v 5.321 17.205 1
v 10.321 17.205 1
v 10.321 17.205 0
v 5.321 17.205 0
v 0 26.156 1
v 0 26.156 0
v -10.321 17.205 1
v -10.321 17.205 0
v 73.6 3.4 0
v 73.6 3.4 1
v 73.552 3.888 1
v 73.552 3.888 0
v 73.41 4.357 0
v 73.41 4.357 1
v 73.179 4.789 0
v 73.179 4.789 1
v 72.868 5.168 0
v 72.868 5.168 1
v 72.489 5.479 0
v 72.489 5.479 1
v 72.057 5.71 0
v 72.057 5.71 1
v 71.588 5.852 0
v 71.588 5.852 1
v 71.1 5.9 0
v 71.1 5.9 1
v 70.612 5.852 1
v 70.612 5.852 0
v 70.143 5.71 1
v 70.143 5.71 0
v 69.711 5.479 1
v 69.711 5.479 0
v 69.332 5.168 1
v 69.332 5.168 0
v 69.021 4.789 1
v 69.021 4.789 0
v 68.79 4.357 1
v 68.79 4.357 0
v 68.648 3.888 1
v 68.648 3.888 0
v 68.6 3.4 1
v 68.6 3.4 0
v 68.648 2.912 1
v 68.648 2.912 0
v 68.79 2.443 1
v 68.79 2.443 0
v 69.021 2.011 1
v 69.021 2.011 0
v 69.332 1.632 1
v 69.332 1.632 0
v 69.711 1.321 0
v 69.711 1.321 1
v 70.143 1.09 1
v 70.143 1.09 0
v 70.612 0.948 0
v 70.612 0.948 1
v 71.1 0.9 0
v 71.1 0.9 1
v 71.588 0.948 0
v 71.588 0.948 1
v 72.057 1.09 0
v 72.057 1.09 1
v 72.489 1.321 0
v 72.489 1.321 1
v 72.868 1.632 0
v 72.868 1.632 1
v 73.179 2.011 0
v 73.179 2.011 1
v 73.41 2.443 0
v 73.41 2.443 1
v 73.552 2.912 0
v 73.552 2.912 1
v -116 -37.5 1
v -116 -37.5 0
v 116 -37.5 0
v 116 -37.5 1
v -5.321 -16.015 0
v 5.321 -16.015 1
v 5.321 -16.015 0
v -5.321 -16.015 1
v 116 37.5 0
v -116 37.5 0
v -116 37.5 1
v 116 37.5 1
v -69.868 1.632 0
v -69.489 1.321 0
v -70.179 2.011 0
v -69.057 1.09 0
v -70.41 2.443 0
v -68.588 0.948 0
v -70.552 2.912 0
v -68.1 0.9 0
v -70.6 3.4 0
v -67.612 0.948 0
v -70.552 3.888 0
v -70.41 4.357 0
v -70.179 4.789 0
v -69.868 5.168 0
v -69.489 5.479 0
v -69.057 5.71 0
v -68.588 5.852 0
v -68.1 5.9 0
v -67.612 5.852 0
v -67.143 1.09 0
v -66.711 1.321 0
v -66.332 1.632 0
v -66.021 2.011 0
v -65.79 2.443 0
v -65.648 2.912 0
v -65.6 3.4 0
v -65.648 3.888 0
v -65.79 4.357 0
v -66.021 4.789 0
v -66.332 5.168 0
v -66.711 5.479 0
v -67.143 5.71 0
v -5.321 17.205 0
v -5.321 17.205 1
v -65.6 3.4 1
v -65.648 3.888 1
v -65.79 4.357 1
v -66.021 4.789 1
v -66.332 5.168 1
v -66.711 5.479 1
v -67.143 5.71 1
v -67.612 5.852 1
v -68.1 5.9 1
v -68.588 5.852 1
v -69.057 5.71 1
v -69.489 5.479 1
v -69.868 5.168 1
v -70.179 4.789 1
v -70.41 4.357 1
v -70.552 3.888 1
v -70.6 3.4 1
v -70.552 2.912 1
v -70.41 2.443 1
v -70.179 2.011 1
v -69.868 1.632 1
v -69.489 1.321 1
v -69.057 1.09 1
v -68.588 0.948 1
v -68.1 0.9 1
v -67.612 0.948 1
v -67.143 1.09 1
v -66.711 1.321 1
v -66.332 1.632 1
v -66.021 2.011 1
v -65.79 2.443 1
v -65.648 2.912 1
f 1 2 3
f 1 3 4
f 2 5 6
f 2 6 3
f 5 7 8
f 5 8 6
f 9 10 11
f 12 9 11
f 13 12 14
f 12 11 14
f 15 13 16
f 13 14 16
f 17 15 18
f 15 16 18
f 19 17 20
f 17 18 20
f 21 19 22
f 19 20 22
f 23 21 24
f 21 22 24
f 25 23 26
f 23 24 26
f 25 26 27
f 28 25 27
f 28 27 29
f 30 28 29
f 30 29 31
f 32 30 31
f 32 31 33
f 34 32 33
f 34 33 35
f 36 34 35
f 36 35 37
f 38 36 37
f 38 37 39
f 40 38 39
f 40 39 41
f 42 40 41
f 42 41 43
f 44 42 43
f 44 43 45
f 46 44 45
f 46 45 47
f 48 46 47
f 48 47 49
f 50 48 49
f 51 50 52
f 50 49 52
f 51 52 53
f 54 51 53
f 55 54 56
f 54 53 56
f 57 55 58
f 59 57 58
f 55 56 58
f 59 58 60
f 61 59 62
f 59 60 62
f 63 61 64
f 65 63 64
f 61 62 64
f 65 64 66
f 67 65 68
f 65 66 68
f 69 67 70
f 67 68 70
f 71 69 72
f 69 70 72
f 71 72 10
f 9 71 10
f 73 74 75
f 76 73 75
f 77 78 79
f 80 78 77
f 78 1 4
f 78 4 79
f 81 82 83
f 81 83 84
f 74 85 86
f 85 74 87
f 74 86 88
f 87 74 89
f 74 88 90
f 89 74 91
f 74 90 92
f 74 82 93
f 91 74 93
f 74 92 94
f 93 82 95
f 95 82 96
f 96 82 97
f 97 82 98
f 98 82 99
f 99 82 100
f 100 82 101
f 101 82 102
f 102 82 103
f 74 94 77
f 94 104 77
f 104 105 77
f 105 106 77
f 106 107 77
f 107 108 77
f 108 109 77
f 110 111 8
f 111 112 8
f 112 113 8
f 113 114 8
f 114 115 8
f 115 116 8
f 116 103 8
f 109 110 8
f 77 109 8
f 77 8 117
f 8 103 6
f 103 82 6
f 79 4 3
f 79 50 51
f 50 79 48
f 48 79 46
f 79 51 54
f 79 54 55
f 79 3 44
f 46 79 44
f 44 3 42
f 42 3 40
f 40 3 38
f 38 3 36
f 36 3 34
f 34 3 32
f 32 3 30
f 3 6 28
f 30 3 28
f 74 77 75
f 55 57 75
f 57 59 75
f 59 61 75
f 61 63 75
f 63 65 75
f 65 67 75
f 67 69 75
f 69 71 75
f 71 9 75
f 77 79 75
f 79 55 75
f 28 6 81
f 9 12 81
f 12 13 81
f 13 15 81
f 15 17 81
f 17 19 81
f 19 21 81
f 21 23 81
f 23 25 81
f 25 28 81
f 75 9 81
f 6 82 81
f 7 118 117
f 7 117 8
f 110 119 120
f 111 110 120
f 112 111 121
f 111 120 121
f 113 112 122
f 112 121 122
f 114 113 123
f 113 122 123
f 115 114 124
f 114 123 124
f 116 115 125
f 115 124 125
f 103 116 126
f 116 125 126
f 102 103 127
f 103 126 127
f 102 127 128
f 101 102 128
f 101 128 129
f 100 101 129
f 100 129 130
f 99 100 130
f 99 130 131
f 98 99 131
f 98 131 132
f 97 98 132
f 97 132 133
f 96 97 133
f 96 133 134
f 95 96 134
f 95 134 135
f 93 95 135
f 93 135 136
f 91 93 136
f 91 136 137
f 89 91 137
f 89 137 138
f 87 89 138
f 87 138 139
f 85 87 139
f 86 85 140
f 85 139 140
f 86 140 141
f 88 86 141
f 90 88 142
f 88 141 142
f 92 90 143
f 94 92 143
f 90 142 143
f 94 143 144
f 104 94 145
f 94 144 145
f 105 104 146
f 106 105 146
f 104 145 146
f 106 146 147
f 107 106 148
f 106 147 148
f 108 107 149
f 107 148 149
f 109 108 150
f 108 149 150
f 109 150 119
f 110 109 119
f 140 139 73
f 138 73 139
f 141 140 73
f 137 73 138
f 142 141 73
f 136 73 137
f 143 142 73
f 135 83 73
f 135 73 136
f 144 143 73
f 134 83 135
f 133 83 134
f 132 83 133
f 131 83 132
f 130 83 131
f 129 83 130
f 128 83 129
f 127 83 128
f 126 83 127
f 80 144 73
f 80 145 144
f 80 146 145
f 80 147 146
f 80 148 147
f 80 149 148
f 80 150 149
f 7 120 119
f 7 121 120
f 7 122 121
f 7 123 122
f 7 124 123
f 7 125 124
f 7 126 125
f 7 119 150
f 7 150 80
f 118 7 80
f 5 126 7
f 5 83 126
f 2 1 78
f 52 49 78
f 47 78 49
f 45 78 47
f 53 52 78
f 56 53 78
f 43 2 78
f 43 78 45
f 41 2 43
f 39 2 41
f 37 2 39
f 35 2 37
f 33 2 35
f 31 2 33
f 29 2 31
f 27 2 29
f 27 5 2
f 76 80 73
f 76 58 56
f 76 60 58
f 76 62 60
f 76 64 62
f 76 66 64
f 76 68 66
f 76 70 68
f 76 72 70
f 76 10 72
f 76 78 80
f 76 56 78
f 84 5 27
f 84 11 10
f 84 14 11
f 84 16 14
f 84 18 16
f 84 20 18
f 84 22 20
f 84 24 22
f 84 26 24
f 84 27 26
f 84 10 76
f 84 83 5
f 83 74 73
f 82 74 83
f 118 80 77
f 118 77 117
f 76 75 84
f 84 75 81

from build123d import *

# Parameters (mm, degrees)
SKETCH_W     = 232
SKETCH_H     = 75
PAD_DEPTH    = 1
SKETCH001_R  = 2.5
POCKET_DEPTH = 5


with BuildPart() as part:
    # Sketch → Pad (new body)
    with BuildSketch(Plane.XY):
        Rectangle(SKETCH_W, SKETCH_H)
    extrude(amount=PAD_DEPTH)

    # Sketch001 (on Face6 of Pad) → Pocket (cut)
    with BuildSketch(Plane.XY.offset(1)):
        with Locations((-68.1, 3.4)):
            Circle(SKETCH001_R)
        with Locations((71.1, 3.4)):
            Circle(SKETCH001_R)
        Polygon((-5.320624, -16.015108), (-5.320624, 17.20542), (-10.320624, 17.20542), (0, 26.156277), (10.320624, 17.20542), (5.320624, 17.20542), (5.320624, -16.015108), align=None)
    extrude(amount=-POCKET_DEPTH, mode=Mode.SUBTRACT)


solid = part.part
